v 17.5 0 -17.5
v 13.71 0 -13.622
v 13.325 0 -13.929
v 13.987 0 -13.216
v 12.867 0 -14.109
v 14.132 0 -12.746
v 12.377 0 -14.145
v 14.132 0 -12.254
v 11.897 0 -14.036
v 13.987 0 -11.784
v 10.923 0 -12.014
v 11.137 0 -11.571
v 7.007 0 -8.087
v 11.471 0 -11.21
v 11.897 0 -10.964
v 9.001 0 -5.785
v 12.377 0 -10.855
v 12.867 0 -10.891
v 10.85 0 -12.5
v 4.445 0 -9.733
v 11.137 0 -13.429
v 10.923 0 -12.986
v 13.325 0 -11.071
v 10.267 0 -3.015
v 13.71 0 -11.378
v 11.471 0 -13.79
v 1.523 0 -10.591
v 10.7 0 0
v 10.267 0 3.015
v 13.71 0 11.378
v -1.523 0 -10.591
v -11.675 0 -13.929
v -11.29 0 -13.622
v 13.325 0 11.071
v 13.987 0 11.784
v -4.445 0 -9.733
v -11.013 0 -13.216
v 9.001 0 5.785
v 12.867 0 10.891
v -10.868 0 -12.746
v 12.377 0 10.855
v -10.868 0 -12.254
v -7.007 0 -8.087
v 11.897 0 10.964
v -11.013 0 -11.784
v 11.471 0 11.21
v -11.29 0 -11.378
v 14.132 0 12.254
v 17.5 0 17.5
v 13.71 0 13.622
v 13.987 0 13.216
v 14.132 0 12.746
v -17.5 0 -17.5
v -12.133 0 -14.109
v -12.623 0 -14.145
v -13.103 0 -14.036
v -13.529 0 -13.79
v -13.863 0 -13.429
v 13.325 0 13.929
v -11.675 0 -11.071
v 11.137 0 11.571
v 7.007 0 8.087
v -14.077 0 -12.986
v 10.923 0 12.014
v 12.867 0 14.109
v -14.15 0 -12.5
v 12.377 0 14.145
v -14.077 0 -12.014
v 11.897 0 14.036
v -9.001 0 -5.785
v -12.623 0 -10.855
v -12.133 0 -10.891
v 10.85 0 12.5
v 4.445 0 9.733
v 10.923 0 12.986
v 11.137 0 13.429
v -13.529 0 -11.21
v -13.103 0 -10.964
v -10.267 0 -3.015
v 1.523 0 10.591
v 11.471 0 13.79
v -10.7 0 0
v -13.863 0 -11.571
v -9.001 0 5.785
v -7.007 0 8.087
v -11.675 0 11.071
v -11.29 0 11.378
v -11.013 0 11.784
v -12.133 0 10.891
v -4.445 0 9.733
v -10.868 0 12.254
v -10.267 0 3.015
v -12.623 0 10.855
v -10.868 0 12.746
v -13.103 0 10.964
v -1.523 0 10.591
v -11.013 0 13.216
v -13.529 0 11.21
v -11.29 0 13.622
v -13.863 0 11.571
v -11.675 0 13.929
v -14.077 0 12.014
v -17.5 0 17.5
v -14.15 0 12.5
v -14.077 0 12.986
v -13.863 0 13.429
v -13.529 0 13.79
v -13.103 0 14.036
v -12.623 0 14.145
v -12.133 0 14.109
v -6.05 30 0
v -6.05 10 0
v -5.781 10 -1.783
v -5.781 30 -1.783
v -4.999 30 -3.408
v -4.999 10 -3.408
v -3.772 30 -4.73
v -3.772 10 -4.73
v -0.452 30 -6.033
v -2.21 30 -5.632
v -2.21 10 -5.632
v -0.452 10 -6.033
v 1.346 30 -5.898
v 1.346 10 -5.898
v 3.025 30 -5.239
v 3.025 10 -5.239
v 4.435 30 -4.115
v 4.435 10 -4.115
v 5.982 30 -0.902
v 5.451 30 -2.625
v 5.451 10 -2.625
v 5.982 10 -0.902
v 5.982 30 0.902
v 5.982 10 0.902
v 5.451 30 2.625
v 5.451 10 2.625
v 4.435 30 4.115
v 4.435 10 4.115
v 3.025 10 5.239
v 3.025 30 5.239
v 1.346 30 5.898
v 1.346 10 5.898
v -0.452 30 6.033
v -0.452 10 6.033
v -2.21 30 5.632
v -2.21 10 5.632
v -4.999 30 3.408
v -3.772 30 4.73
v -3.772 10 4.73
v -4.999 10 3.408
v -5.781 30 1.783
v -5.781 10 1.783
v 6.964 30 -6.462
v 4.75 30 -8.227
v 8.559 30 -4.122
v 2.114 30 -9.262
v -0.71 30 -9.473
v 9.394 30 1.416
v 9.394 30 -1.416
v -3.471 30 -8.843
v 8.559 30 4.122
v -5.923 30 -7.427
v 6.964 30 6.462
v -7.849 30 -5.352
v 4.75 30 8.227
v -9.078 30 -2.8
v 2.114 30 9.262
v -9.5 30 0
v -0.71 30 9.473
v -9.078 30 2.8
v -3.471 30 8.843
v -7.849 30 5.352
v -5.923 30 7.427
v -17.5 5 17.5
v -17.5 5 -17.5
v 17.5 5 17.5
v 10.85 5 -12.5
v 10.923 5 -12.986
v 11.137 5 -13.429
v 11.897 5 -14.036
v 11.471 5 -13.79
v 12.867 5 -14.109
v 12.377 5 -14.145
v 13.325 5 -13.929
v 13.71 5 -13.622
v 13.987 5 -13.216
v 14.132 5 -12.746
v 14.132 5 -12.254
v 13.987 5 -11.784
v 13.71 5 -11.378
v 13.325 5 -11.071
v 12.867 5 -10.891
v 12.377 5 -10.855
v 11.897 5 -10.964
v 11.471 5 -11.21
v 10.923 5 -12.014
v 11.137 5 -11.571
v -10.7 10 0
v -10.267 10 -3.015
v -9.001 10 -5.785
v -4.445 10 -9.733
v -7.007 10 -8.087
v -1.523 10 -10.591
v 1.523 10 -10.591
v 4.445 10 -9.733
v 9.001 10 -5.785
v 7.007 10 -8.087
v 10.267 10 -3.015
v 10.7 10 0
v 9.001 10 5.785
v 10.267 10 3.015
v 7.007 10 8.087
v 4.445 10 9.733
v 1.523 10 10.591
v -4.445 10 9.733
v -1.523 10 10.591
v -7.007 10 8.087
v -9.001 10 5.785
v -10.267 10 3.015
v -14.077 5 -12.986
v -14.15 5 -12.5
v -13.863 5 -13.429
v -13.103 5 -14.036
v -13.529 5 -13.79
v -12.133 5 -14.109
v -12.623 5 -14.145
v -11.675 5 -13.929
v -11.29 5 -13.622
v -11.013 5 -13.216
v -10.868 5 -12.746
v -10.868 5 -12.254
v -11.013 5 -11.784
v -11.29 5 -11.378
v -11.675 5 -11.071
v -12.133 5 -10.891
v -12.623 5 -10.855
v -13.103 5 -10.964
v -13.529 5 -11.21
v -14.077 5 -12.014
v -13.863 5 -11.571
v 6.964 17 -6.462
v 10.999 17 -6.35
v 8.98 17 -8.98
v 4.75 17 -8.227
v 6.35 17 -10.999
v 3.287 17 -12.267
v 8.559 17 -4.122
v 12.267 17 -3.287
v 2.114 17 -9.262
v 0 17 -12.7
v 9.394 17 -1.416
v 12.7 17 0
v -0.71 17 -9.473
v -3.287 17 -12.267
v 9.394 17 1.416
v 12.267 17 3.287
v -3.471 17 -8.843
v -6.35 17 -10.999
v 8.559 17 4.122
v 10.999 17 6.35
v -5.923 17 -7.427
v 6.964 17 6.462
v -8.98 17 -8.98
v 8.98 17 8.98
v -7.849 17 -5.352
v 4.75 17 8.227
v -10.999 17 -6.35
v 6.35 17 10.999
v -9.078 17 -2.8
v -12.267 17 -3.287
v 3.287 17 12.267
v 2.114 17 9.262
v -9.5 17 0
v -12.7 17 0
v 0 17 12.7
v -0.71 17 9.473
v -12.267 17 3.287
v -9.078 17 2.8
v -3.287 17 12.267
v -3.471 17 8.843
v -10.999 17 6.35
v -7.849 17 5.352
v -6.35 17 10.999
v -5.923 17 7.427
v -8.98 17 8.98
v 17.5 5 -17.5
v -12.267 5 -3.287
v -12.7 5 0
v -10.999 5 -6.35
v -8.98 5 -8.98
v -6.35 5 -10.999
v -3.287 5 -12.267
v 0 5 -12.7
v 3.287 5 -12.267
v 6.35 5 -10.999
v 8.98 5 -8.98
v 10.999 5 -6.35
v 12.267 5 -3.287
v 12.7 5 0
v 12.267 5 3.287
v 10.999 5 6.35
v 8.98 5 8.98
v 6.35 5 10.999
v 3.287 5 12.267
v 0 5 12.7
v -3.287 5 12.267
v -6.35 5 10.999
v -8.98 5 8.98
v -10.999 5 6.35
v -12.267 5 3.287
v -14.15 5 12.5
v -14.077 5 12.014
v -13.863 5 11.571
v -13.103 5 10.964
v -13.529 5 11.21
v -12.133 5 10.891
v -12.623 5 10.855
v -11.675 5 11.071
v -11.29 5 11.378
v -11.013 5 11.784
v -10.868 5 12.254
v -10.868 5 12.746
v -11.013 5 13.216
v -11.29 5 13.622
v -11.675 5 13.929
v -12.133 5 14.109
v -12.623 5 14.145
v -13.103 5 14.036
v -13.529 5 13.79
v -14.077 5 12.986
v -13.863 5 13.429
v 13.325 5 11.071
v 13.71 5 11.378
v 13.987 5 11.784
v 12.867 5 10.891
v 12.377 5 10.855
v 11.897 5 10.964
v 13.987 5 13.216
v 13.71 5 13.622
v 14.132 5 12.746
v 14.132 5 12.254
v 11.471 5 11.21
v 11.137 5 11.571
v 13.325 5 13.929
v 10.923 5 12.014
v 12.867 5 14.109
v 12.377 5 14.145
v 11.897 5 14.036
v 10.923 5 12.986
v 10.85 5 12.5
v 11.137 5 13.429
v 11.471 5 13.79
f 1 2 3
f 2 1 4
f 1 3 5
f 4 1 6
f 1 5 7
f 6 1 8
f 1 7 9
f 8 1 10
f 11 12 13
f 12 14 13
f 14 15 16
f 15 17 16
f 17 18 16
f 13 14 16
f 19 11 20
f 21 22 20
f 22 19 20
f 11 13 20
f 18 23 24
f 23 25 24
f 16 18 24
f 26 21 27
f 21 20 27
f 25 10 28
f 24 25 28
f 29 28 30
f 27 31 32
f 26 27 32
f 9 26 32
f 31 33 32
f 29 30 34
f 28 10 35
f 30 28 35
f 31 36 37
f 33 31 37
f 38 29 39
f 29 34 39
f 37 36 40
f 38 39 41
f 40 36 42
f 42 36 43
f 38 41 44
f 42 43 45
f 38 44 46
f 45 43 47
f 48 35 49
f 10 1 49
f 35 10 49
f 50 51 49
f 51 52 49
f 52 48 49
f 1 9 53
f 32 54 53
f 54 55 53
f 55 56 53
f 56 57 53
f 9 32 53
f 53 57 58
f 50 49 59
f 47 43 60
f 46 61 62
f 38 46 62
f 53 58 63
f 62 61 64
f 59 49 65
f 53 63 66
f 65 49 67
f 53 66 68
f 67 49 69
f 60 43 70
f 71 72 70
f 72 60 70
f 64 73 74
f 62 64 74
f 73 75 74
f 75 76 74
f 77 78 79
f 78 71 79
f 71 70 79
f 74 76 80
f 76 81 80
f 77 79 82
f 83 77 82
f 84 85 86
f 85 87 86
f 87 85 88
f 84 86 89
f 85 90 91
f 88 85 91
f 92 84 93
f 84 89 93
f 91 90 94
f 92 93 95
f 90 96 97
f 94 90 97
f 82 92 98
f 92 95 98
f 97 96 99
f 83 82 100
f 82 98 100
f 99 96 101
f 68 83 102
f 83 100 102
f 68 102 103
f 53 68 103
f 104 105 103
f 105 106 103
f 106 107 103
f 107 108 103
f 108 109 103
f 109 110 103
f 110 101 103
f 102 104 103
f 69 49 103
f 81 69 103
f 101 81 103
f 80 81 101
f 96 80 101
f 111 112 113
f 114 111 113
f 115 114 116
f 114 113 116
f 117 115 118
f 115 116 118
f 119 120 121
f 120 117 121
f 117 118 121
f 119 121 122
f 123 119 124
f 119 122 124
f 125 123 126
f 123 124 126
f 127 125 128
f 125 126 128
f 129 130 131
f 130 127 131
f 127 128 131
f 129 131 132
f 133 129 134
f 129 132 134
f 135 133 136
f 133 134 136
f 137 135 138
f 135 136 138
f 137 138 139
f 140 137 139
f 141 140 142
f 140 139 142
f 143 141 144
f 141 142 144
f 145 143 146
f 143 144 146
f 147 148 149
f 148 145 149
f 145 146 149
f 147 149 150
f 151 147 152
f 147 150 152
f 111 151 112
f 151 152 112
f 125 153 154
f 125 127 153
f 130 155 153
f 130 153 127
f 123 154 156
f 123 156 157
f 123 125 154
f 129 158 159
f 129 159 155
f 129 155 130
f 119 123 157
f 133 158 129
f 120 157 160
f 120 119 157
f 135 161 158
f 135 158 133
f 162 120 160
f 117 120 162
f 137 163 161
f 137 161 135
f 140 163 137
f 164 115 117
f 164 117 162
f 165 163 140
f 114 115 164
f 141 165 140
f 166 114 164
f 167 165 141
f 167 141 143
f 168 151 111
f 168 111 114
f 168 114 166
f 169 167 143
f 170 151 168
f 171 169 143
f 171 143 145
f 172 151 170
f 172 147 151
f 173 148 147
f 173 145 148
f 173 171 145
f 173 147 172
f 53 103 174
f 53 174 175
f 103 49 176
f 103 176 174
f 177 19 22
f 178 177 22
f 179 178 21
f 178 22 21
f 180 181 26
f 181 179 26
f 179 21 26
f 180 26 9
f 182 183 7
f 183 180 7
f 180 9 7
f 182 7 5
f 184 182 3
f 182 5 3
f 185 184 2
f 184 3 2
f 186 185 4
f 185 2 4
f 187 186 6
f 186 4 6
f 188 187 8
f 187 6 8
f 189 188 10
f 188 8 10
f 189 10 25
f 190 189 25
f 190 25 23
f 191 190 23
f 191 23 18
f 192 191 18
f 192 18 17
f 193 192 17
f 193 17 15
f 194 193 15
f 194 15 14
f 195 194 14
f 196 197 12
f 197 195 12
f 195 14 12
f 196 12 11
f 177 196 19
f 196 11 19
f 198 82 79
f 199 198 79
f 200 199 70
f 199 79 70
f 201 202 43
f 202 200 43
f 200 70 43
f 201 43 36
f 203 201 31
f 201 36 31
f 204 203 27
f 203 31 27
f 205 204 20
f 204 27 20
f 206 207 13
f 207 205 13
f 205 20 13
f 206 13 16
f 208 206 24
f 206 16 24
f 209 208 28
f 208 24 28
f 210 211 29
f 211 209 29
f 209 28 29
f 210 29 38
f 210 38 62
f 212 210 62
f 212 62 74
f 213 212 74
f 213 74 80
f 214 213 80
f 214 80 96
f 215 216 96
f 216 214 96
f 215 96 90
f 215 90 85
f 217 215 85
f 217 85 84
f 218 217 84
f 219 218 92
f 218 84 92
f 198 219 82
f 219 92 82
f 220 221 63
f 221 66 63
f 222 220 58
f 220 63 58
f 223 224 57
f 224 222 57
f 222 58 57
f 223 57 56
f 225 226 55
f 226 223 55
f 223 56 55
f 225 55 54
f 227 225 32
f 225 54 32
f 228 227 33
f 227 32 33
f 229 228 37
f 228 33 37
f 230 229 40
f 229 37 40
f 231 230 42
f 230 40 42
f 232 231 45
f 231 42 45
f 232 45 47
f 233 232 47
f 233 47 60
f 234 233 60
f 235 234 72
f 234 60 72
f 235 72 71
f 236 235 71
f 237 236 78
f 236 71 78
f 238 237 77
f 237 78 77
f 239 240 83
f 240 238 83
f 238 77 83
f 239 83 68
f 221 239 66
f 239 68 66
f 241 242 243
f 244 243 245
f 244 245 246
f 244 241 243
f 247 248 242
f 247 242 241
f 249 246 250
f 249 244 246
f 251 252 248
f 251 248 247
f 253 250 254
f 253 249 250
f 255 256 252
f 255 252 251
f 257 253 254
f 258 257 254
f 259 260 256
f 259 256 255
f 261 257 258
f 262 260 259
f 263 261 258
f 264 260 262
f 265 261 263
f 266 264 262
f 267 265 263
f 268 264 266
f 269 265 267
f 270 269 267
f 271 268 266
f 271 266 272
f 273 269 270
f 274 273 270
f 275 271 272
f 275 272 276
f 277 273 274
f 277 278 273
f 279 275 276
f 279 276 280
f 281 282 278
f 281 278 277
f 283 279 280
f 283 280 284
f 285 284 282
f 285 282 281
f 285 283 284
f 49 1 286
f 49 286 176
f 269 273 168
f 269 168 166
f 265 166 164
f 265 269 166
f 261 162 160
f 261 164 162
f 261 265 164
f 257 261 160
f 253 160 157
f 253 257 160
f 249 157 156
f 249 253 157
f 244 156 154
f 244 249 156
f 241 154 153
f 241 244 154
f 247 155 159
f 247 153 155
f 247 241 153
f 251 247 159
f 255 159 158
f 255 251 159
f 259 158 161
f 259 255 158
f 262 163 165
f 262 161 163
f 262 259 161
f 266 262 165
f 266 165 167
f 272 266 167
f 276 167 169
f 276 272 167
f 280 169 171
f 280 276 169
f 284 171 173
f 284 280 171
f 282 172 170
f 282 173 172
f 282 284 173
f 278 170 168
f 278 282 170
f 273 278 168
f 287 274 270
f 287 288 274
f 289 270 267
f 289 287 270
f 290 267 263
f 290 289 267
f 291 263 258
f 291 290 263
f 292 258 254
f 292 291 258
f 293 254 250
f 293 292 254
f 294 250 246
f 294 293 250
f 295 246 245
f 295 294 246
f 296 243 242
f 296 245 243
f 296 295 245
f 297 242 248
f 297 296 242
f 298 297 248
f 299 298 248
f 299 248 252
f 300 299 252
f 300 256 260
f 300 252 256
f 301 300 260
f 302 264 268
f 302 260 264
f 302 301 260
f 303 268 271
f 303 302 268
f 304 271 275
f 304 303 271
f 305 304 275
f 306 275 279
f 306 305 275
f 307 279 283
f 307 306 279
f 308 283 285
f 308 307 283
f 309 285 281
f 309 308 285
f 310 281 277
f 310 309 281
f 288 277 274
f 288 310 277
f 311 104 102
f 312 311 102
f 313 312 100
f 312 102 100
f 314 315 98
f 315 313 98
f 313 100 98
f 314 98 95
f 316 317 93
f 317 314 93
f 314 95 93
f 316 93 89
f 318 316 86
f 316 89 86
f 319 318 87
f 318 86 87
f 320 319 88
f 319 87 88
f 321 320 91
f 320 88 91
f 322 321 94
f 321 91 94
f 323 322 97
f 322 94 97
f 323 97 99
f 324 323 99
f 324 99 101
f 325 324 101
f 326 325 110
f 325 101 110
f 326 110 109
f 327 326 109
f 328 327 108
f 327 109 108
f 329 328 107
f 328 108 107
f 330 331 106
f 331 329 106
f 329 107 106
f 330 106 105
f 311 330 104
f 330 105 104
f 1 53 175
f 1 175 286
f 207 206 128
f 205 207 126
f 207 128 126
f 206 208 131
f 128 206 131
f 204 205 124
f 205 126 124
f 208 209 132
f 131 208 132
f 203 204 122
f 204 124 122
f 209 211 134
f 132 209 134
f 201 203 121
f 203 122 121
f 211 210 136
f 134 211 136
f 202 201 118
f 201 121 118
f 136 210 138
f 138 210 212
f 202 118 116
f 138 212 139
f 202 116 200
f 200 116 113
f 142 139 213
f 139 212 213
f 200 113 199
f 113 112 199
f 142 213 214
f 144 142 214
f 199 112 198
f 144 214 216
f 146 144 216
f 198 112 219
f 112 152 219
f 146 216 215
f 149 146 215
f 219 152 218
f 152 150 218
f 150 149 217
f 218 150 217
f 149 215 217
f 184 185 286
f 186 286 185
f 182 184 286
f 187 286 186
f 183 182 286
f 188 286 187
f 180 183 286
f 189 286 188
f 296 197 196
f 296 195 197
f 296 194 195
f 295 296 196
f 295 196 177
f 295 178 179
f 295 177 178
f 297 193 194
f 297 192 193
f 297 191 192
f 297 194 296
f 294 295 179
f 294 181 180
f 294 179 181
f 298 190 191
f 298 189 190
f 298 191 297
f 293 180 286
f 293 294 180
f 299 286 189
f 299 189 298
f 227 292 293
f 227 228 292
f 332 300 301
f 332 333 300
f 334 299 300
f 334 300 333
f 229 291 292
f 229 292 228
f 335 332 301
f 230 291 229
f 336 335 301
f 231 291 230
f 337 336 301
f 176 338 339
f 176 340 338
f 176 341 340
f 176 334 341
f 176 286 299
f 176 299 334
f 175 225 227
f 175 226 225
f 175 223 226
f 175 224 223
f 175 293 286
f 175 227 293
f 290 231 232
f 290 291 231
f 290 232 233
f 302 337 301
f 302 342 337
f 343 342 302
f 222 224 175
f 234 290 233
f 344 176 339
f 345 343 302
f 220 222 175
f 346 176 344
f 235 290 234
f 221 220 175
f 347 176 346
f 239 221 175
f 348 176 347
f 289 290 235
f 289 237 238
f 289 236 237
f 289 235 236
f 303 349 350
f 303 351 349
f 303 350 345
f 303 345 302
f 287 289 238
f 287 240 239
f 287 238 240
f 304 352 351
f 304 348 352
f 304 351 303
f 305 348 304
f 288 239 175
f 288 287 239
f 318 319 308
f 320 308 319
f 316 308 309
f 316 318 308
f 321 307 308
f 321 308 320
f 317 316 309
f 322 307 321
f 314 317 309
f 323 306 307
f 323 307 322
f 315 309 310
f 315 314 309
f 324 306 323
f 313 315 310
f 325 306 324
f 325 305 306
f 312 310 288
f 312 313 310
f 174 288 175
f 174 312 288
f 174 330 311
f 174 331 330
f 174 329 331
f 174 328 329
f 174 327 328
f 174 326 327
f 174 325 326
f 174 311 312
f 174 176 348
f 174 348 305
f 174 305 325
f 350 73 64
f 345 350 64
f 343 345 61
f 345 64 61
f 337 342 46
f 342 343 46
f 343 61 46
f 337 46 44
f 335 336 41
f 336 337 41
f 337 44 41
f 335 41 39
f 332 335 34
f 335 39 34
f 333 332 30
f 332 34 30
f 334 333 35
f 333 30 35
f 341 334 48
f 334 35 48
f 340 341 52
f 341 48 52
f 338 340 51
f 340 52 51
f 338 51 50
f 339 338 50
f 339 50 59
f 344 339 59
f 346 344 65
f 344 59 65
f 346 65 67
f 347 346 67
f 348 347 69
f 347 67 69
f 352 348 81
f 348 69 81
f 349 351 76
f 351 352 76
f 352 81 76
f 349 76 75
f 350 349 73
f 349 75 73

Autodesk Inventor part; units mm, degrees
ref_plane "YZ Plane" through (0, 0, 0) normal (1, 0, 0) x (0, 1, 0)
ref_plane "XZ Plane" through (0, 0, 0) normal (0, 1, 0) x (-1, 0, 0)
ref_plane "XY Plane" through (0, 0, 0) normal (0, 0, 1) x (1, 0, 0)
sketch "Sketch1" plane through (0, 0, 0) normal (0, 1, 0) x (-1, 0, 0)
  line L0 (-17.5, 17.5) -> (17.5, 17.5)
  line L1 (17.5, 17.5) -> (17.5, -17.5)
  line L2 (17.5, -17.5) -> (-17.5, -17.5)
  line L3 (-17.5, -17.5) -> (-17.5, 17.5)
  line L4 (-17.5, 17.5) -> (17.5, -17.5) construction
  line L5 (17.5, 17.5) -> (-17.5, -17.5) construction
  circle A0 centre (12.5, -12.5) radius 1.65
  circle A1 centre (12.5, 12.5) radius 1.65
  circle A2 centre (-12.5, 12.5) radius 1.65
  circle A3 centre (-12.5, -12.5) radius 1.65
  circle A4 centre (0, 0) radius 6.05
  circle A5 centre (0, 0) radius 9.5
  circle A6 centre (0, 0) radius 12.7
  circle A7 centre (0, 0) radius 10.7
  dimension "d0" = 35
  dimension "d1" = 35
  dimension "d2" = 3.3
  dimension "d3" = 5
  dimension "d6" = 360
  dimension "d8" = 12.1
  dimension "d9" = 19
  dimension "d14" = 25.4
  dimension "d17" = 21.4
extrude "Extrusion1" add sketch "Sketch1" along normal blind 5 contours L0 L1 L2 L3 | A6
extrude "Extrusion2" add sketch "Sketch1" along normal blind 30 contours A5
extrude "Extrusion3" add sketch "Sketch1" along normal blind 17 contours A6 | A7
extrude "Extrusion4" cut sketch "Sketch1" along normal blind 10 contours A5 | A7
equation "\"d1\" = d0"
properties part number "test de tolerancia"
